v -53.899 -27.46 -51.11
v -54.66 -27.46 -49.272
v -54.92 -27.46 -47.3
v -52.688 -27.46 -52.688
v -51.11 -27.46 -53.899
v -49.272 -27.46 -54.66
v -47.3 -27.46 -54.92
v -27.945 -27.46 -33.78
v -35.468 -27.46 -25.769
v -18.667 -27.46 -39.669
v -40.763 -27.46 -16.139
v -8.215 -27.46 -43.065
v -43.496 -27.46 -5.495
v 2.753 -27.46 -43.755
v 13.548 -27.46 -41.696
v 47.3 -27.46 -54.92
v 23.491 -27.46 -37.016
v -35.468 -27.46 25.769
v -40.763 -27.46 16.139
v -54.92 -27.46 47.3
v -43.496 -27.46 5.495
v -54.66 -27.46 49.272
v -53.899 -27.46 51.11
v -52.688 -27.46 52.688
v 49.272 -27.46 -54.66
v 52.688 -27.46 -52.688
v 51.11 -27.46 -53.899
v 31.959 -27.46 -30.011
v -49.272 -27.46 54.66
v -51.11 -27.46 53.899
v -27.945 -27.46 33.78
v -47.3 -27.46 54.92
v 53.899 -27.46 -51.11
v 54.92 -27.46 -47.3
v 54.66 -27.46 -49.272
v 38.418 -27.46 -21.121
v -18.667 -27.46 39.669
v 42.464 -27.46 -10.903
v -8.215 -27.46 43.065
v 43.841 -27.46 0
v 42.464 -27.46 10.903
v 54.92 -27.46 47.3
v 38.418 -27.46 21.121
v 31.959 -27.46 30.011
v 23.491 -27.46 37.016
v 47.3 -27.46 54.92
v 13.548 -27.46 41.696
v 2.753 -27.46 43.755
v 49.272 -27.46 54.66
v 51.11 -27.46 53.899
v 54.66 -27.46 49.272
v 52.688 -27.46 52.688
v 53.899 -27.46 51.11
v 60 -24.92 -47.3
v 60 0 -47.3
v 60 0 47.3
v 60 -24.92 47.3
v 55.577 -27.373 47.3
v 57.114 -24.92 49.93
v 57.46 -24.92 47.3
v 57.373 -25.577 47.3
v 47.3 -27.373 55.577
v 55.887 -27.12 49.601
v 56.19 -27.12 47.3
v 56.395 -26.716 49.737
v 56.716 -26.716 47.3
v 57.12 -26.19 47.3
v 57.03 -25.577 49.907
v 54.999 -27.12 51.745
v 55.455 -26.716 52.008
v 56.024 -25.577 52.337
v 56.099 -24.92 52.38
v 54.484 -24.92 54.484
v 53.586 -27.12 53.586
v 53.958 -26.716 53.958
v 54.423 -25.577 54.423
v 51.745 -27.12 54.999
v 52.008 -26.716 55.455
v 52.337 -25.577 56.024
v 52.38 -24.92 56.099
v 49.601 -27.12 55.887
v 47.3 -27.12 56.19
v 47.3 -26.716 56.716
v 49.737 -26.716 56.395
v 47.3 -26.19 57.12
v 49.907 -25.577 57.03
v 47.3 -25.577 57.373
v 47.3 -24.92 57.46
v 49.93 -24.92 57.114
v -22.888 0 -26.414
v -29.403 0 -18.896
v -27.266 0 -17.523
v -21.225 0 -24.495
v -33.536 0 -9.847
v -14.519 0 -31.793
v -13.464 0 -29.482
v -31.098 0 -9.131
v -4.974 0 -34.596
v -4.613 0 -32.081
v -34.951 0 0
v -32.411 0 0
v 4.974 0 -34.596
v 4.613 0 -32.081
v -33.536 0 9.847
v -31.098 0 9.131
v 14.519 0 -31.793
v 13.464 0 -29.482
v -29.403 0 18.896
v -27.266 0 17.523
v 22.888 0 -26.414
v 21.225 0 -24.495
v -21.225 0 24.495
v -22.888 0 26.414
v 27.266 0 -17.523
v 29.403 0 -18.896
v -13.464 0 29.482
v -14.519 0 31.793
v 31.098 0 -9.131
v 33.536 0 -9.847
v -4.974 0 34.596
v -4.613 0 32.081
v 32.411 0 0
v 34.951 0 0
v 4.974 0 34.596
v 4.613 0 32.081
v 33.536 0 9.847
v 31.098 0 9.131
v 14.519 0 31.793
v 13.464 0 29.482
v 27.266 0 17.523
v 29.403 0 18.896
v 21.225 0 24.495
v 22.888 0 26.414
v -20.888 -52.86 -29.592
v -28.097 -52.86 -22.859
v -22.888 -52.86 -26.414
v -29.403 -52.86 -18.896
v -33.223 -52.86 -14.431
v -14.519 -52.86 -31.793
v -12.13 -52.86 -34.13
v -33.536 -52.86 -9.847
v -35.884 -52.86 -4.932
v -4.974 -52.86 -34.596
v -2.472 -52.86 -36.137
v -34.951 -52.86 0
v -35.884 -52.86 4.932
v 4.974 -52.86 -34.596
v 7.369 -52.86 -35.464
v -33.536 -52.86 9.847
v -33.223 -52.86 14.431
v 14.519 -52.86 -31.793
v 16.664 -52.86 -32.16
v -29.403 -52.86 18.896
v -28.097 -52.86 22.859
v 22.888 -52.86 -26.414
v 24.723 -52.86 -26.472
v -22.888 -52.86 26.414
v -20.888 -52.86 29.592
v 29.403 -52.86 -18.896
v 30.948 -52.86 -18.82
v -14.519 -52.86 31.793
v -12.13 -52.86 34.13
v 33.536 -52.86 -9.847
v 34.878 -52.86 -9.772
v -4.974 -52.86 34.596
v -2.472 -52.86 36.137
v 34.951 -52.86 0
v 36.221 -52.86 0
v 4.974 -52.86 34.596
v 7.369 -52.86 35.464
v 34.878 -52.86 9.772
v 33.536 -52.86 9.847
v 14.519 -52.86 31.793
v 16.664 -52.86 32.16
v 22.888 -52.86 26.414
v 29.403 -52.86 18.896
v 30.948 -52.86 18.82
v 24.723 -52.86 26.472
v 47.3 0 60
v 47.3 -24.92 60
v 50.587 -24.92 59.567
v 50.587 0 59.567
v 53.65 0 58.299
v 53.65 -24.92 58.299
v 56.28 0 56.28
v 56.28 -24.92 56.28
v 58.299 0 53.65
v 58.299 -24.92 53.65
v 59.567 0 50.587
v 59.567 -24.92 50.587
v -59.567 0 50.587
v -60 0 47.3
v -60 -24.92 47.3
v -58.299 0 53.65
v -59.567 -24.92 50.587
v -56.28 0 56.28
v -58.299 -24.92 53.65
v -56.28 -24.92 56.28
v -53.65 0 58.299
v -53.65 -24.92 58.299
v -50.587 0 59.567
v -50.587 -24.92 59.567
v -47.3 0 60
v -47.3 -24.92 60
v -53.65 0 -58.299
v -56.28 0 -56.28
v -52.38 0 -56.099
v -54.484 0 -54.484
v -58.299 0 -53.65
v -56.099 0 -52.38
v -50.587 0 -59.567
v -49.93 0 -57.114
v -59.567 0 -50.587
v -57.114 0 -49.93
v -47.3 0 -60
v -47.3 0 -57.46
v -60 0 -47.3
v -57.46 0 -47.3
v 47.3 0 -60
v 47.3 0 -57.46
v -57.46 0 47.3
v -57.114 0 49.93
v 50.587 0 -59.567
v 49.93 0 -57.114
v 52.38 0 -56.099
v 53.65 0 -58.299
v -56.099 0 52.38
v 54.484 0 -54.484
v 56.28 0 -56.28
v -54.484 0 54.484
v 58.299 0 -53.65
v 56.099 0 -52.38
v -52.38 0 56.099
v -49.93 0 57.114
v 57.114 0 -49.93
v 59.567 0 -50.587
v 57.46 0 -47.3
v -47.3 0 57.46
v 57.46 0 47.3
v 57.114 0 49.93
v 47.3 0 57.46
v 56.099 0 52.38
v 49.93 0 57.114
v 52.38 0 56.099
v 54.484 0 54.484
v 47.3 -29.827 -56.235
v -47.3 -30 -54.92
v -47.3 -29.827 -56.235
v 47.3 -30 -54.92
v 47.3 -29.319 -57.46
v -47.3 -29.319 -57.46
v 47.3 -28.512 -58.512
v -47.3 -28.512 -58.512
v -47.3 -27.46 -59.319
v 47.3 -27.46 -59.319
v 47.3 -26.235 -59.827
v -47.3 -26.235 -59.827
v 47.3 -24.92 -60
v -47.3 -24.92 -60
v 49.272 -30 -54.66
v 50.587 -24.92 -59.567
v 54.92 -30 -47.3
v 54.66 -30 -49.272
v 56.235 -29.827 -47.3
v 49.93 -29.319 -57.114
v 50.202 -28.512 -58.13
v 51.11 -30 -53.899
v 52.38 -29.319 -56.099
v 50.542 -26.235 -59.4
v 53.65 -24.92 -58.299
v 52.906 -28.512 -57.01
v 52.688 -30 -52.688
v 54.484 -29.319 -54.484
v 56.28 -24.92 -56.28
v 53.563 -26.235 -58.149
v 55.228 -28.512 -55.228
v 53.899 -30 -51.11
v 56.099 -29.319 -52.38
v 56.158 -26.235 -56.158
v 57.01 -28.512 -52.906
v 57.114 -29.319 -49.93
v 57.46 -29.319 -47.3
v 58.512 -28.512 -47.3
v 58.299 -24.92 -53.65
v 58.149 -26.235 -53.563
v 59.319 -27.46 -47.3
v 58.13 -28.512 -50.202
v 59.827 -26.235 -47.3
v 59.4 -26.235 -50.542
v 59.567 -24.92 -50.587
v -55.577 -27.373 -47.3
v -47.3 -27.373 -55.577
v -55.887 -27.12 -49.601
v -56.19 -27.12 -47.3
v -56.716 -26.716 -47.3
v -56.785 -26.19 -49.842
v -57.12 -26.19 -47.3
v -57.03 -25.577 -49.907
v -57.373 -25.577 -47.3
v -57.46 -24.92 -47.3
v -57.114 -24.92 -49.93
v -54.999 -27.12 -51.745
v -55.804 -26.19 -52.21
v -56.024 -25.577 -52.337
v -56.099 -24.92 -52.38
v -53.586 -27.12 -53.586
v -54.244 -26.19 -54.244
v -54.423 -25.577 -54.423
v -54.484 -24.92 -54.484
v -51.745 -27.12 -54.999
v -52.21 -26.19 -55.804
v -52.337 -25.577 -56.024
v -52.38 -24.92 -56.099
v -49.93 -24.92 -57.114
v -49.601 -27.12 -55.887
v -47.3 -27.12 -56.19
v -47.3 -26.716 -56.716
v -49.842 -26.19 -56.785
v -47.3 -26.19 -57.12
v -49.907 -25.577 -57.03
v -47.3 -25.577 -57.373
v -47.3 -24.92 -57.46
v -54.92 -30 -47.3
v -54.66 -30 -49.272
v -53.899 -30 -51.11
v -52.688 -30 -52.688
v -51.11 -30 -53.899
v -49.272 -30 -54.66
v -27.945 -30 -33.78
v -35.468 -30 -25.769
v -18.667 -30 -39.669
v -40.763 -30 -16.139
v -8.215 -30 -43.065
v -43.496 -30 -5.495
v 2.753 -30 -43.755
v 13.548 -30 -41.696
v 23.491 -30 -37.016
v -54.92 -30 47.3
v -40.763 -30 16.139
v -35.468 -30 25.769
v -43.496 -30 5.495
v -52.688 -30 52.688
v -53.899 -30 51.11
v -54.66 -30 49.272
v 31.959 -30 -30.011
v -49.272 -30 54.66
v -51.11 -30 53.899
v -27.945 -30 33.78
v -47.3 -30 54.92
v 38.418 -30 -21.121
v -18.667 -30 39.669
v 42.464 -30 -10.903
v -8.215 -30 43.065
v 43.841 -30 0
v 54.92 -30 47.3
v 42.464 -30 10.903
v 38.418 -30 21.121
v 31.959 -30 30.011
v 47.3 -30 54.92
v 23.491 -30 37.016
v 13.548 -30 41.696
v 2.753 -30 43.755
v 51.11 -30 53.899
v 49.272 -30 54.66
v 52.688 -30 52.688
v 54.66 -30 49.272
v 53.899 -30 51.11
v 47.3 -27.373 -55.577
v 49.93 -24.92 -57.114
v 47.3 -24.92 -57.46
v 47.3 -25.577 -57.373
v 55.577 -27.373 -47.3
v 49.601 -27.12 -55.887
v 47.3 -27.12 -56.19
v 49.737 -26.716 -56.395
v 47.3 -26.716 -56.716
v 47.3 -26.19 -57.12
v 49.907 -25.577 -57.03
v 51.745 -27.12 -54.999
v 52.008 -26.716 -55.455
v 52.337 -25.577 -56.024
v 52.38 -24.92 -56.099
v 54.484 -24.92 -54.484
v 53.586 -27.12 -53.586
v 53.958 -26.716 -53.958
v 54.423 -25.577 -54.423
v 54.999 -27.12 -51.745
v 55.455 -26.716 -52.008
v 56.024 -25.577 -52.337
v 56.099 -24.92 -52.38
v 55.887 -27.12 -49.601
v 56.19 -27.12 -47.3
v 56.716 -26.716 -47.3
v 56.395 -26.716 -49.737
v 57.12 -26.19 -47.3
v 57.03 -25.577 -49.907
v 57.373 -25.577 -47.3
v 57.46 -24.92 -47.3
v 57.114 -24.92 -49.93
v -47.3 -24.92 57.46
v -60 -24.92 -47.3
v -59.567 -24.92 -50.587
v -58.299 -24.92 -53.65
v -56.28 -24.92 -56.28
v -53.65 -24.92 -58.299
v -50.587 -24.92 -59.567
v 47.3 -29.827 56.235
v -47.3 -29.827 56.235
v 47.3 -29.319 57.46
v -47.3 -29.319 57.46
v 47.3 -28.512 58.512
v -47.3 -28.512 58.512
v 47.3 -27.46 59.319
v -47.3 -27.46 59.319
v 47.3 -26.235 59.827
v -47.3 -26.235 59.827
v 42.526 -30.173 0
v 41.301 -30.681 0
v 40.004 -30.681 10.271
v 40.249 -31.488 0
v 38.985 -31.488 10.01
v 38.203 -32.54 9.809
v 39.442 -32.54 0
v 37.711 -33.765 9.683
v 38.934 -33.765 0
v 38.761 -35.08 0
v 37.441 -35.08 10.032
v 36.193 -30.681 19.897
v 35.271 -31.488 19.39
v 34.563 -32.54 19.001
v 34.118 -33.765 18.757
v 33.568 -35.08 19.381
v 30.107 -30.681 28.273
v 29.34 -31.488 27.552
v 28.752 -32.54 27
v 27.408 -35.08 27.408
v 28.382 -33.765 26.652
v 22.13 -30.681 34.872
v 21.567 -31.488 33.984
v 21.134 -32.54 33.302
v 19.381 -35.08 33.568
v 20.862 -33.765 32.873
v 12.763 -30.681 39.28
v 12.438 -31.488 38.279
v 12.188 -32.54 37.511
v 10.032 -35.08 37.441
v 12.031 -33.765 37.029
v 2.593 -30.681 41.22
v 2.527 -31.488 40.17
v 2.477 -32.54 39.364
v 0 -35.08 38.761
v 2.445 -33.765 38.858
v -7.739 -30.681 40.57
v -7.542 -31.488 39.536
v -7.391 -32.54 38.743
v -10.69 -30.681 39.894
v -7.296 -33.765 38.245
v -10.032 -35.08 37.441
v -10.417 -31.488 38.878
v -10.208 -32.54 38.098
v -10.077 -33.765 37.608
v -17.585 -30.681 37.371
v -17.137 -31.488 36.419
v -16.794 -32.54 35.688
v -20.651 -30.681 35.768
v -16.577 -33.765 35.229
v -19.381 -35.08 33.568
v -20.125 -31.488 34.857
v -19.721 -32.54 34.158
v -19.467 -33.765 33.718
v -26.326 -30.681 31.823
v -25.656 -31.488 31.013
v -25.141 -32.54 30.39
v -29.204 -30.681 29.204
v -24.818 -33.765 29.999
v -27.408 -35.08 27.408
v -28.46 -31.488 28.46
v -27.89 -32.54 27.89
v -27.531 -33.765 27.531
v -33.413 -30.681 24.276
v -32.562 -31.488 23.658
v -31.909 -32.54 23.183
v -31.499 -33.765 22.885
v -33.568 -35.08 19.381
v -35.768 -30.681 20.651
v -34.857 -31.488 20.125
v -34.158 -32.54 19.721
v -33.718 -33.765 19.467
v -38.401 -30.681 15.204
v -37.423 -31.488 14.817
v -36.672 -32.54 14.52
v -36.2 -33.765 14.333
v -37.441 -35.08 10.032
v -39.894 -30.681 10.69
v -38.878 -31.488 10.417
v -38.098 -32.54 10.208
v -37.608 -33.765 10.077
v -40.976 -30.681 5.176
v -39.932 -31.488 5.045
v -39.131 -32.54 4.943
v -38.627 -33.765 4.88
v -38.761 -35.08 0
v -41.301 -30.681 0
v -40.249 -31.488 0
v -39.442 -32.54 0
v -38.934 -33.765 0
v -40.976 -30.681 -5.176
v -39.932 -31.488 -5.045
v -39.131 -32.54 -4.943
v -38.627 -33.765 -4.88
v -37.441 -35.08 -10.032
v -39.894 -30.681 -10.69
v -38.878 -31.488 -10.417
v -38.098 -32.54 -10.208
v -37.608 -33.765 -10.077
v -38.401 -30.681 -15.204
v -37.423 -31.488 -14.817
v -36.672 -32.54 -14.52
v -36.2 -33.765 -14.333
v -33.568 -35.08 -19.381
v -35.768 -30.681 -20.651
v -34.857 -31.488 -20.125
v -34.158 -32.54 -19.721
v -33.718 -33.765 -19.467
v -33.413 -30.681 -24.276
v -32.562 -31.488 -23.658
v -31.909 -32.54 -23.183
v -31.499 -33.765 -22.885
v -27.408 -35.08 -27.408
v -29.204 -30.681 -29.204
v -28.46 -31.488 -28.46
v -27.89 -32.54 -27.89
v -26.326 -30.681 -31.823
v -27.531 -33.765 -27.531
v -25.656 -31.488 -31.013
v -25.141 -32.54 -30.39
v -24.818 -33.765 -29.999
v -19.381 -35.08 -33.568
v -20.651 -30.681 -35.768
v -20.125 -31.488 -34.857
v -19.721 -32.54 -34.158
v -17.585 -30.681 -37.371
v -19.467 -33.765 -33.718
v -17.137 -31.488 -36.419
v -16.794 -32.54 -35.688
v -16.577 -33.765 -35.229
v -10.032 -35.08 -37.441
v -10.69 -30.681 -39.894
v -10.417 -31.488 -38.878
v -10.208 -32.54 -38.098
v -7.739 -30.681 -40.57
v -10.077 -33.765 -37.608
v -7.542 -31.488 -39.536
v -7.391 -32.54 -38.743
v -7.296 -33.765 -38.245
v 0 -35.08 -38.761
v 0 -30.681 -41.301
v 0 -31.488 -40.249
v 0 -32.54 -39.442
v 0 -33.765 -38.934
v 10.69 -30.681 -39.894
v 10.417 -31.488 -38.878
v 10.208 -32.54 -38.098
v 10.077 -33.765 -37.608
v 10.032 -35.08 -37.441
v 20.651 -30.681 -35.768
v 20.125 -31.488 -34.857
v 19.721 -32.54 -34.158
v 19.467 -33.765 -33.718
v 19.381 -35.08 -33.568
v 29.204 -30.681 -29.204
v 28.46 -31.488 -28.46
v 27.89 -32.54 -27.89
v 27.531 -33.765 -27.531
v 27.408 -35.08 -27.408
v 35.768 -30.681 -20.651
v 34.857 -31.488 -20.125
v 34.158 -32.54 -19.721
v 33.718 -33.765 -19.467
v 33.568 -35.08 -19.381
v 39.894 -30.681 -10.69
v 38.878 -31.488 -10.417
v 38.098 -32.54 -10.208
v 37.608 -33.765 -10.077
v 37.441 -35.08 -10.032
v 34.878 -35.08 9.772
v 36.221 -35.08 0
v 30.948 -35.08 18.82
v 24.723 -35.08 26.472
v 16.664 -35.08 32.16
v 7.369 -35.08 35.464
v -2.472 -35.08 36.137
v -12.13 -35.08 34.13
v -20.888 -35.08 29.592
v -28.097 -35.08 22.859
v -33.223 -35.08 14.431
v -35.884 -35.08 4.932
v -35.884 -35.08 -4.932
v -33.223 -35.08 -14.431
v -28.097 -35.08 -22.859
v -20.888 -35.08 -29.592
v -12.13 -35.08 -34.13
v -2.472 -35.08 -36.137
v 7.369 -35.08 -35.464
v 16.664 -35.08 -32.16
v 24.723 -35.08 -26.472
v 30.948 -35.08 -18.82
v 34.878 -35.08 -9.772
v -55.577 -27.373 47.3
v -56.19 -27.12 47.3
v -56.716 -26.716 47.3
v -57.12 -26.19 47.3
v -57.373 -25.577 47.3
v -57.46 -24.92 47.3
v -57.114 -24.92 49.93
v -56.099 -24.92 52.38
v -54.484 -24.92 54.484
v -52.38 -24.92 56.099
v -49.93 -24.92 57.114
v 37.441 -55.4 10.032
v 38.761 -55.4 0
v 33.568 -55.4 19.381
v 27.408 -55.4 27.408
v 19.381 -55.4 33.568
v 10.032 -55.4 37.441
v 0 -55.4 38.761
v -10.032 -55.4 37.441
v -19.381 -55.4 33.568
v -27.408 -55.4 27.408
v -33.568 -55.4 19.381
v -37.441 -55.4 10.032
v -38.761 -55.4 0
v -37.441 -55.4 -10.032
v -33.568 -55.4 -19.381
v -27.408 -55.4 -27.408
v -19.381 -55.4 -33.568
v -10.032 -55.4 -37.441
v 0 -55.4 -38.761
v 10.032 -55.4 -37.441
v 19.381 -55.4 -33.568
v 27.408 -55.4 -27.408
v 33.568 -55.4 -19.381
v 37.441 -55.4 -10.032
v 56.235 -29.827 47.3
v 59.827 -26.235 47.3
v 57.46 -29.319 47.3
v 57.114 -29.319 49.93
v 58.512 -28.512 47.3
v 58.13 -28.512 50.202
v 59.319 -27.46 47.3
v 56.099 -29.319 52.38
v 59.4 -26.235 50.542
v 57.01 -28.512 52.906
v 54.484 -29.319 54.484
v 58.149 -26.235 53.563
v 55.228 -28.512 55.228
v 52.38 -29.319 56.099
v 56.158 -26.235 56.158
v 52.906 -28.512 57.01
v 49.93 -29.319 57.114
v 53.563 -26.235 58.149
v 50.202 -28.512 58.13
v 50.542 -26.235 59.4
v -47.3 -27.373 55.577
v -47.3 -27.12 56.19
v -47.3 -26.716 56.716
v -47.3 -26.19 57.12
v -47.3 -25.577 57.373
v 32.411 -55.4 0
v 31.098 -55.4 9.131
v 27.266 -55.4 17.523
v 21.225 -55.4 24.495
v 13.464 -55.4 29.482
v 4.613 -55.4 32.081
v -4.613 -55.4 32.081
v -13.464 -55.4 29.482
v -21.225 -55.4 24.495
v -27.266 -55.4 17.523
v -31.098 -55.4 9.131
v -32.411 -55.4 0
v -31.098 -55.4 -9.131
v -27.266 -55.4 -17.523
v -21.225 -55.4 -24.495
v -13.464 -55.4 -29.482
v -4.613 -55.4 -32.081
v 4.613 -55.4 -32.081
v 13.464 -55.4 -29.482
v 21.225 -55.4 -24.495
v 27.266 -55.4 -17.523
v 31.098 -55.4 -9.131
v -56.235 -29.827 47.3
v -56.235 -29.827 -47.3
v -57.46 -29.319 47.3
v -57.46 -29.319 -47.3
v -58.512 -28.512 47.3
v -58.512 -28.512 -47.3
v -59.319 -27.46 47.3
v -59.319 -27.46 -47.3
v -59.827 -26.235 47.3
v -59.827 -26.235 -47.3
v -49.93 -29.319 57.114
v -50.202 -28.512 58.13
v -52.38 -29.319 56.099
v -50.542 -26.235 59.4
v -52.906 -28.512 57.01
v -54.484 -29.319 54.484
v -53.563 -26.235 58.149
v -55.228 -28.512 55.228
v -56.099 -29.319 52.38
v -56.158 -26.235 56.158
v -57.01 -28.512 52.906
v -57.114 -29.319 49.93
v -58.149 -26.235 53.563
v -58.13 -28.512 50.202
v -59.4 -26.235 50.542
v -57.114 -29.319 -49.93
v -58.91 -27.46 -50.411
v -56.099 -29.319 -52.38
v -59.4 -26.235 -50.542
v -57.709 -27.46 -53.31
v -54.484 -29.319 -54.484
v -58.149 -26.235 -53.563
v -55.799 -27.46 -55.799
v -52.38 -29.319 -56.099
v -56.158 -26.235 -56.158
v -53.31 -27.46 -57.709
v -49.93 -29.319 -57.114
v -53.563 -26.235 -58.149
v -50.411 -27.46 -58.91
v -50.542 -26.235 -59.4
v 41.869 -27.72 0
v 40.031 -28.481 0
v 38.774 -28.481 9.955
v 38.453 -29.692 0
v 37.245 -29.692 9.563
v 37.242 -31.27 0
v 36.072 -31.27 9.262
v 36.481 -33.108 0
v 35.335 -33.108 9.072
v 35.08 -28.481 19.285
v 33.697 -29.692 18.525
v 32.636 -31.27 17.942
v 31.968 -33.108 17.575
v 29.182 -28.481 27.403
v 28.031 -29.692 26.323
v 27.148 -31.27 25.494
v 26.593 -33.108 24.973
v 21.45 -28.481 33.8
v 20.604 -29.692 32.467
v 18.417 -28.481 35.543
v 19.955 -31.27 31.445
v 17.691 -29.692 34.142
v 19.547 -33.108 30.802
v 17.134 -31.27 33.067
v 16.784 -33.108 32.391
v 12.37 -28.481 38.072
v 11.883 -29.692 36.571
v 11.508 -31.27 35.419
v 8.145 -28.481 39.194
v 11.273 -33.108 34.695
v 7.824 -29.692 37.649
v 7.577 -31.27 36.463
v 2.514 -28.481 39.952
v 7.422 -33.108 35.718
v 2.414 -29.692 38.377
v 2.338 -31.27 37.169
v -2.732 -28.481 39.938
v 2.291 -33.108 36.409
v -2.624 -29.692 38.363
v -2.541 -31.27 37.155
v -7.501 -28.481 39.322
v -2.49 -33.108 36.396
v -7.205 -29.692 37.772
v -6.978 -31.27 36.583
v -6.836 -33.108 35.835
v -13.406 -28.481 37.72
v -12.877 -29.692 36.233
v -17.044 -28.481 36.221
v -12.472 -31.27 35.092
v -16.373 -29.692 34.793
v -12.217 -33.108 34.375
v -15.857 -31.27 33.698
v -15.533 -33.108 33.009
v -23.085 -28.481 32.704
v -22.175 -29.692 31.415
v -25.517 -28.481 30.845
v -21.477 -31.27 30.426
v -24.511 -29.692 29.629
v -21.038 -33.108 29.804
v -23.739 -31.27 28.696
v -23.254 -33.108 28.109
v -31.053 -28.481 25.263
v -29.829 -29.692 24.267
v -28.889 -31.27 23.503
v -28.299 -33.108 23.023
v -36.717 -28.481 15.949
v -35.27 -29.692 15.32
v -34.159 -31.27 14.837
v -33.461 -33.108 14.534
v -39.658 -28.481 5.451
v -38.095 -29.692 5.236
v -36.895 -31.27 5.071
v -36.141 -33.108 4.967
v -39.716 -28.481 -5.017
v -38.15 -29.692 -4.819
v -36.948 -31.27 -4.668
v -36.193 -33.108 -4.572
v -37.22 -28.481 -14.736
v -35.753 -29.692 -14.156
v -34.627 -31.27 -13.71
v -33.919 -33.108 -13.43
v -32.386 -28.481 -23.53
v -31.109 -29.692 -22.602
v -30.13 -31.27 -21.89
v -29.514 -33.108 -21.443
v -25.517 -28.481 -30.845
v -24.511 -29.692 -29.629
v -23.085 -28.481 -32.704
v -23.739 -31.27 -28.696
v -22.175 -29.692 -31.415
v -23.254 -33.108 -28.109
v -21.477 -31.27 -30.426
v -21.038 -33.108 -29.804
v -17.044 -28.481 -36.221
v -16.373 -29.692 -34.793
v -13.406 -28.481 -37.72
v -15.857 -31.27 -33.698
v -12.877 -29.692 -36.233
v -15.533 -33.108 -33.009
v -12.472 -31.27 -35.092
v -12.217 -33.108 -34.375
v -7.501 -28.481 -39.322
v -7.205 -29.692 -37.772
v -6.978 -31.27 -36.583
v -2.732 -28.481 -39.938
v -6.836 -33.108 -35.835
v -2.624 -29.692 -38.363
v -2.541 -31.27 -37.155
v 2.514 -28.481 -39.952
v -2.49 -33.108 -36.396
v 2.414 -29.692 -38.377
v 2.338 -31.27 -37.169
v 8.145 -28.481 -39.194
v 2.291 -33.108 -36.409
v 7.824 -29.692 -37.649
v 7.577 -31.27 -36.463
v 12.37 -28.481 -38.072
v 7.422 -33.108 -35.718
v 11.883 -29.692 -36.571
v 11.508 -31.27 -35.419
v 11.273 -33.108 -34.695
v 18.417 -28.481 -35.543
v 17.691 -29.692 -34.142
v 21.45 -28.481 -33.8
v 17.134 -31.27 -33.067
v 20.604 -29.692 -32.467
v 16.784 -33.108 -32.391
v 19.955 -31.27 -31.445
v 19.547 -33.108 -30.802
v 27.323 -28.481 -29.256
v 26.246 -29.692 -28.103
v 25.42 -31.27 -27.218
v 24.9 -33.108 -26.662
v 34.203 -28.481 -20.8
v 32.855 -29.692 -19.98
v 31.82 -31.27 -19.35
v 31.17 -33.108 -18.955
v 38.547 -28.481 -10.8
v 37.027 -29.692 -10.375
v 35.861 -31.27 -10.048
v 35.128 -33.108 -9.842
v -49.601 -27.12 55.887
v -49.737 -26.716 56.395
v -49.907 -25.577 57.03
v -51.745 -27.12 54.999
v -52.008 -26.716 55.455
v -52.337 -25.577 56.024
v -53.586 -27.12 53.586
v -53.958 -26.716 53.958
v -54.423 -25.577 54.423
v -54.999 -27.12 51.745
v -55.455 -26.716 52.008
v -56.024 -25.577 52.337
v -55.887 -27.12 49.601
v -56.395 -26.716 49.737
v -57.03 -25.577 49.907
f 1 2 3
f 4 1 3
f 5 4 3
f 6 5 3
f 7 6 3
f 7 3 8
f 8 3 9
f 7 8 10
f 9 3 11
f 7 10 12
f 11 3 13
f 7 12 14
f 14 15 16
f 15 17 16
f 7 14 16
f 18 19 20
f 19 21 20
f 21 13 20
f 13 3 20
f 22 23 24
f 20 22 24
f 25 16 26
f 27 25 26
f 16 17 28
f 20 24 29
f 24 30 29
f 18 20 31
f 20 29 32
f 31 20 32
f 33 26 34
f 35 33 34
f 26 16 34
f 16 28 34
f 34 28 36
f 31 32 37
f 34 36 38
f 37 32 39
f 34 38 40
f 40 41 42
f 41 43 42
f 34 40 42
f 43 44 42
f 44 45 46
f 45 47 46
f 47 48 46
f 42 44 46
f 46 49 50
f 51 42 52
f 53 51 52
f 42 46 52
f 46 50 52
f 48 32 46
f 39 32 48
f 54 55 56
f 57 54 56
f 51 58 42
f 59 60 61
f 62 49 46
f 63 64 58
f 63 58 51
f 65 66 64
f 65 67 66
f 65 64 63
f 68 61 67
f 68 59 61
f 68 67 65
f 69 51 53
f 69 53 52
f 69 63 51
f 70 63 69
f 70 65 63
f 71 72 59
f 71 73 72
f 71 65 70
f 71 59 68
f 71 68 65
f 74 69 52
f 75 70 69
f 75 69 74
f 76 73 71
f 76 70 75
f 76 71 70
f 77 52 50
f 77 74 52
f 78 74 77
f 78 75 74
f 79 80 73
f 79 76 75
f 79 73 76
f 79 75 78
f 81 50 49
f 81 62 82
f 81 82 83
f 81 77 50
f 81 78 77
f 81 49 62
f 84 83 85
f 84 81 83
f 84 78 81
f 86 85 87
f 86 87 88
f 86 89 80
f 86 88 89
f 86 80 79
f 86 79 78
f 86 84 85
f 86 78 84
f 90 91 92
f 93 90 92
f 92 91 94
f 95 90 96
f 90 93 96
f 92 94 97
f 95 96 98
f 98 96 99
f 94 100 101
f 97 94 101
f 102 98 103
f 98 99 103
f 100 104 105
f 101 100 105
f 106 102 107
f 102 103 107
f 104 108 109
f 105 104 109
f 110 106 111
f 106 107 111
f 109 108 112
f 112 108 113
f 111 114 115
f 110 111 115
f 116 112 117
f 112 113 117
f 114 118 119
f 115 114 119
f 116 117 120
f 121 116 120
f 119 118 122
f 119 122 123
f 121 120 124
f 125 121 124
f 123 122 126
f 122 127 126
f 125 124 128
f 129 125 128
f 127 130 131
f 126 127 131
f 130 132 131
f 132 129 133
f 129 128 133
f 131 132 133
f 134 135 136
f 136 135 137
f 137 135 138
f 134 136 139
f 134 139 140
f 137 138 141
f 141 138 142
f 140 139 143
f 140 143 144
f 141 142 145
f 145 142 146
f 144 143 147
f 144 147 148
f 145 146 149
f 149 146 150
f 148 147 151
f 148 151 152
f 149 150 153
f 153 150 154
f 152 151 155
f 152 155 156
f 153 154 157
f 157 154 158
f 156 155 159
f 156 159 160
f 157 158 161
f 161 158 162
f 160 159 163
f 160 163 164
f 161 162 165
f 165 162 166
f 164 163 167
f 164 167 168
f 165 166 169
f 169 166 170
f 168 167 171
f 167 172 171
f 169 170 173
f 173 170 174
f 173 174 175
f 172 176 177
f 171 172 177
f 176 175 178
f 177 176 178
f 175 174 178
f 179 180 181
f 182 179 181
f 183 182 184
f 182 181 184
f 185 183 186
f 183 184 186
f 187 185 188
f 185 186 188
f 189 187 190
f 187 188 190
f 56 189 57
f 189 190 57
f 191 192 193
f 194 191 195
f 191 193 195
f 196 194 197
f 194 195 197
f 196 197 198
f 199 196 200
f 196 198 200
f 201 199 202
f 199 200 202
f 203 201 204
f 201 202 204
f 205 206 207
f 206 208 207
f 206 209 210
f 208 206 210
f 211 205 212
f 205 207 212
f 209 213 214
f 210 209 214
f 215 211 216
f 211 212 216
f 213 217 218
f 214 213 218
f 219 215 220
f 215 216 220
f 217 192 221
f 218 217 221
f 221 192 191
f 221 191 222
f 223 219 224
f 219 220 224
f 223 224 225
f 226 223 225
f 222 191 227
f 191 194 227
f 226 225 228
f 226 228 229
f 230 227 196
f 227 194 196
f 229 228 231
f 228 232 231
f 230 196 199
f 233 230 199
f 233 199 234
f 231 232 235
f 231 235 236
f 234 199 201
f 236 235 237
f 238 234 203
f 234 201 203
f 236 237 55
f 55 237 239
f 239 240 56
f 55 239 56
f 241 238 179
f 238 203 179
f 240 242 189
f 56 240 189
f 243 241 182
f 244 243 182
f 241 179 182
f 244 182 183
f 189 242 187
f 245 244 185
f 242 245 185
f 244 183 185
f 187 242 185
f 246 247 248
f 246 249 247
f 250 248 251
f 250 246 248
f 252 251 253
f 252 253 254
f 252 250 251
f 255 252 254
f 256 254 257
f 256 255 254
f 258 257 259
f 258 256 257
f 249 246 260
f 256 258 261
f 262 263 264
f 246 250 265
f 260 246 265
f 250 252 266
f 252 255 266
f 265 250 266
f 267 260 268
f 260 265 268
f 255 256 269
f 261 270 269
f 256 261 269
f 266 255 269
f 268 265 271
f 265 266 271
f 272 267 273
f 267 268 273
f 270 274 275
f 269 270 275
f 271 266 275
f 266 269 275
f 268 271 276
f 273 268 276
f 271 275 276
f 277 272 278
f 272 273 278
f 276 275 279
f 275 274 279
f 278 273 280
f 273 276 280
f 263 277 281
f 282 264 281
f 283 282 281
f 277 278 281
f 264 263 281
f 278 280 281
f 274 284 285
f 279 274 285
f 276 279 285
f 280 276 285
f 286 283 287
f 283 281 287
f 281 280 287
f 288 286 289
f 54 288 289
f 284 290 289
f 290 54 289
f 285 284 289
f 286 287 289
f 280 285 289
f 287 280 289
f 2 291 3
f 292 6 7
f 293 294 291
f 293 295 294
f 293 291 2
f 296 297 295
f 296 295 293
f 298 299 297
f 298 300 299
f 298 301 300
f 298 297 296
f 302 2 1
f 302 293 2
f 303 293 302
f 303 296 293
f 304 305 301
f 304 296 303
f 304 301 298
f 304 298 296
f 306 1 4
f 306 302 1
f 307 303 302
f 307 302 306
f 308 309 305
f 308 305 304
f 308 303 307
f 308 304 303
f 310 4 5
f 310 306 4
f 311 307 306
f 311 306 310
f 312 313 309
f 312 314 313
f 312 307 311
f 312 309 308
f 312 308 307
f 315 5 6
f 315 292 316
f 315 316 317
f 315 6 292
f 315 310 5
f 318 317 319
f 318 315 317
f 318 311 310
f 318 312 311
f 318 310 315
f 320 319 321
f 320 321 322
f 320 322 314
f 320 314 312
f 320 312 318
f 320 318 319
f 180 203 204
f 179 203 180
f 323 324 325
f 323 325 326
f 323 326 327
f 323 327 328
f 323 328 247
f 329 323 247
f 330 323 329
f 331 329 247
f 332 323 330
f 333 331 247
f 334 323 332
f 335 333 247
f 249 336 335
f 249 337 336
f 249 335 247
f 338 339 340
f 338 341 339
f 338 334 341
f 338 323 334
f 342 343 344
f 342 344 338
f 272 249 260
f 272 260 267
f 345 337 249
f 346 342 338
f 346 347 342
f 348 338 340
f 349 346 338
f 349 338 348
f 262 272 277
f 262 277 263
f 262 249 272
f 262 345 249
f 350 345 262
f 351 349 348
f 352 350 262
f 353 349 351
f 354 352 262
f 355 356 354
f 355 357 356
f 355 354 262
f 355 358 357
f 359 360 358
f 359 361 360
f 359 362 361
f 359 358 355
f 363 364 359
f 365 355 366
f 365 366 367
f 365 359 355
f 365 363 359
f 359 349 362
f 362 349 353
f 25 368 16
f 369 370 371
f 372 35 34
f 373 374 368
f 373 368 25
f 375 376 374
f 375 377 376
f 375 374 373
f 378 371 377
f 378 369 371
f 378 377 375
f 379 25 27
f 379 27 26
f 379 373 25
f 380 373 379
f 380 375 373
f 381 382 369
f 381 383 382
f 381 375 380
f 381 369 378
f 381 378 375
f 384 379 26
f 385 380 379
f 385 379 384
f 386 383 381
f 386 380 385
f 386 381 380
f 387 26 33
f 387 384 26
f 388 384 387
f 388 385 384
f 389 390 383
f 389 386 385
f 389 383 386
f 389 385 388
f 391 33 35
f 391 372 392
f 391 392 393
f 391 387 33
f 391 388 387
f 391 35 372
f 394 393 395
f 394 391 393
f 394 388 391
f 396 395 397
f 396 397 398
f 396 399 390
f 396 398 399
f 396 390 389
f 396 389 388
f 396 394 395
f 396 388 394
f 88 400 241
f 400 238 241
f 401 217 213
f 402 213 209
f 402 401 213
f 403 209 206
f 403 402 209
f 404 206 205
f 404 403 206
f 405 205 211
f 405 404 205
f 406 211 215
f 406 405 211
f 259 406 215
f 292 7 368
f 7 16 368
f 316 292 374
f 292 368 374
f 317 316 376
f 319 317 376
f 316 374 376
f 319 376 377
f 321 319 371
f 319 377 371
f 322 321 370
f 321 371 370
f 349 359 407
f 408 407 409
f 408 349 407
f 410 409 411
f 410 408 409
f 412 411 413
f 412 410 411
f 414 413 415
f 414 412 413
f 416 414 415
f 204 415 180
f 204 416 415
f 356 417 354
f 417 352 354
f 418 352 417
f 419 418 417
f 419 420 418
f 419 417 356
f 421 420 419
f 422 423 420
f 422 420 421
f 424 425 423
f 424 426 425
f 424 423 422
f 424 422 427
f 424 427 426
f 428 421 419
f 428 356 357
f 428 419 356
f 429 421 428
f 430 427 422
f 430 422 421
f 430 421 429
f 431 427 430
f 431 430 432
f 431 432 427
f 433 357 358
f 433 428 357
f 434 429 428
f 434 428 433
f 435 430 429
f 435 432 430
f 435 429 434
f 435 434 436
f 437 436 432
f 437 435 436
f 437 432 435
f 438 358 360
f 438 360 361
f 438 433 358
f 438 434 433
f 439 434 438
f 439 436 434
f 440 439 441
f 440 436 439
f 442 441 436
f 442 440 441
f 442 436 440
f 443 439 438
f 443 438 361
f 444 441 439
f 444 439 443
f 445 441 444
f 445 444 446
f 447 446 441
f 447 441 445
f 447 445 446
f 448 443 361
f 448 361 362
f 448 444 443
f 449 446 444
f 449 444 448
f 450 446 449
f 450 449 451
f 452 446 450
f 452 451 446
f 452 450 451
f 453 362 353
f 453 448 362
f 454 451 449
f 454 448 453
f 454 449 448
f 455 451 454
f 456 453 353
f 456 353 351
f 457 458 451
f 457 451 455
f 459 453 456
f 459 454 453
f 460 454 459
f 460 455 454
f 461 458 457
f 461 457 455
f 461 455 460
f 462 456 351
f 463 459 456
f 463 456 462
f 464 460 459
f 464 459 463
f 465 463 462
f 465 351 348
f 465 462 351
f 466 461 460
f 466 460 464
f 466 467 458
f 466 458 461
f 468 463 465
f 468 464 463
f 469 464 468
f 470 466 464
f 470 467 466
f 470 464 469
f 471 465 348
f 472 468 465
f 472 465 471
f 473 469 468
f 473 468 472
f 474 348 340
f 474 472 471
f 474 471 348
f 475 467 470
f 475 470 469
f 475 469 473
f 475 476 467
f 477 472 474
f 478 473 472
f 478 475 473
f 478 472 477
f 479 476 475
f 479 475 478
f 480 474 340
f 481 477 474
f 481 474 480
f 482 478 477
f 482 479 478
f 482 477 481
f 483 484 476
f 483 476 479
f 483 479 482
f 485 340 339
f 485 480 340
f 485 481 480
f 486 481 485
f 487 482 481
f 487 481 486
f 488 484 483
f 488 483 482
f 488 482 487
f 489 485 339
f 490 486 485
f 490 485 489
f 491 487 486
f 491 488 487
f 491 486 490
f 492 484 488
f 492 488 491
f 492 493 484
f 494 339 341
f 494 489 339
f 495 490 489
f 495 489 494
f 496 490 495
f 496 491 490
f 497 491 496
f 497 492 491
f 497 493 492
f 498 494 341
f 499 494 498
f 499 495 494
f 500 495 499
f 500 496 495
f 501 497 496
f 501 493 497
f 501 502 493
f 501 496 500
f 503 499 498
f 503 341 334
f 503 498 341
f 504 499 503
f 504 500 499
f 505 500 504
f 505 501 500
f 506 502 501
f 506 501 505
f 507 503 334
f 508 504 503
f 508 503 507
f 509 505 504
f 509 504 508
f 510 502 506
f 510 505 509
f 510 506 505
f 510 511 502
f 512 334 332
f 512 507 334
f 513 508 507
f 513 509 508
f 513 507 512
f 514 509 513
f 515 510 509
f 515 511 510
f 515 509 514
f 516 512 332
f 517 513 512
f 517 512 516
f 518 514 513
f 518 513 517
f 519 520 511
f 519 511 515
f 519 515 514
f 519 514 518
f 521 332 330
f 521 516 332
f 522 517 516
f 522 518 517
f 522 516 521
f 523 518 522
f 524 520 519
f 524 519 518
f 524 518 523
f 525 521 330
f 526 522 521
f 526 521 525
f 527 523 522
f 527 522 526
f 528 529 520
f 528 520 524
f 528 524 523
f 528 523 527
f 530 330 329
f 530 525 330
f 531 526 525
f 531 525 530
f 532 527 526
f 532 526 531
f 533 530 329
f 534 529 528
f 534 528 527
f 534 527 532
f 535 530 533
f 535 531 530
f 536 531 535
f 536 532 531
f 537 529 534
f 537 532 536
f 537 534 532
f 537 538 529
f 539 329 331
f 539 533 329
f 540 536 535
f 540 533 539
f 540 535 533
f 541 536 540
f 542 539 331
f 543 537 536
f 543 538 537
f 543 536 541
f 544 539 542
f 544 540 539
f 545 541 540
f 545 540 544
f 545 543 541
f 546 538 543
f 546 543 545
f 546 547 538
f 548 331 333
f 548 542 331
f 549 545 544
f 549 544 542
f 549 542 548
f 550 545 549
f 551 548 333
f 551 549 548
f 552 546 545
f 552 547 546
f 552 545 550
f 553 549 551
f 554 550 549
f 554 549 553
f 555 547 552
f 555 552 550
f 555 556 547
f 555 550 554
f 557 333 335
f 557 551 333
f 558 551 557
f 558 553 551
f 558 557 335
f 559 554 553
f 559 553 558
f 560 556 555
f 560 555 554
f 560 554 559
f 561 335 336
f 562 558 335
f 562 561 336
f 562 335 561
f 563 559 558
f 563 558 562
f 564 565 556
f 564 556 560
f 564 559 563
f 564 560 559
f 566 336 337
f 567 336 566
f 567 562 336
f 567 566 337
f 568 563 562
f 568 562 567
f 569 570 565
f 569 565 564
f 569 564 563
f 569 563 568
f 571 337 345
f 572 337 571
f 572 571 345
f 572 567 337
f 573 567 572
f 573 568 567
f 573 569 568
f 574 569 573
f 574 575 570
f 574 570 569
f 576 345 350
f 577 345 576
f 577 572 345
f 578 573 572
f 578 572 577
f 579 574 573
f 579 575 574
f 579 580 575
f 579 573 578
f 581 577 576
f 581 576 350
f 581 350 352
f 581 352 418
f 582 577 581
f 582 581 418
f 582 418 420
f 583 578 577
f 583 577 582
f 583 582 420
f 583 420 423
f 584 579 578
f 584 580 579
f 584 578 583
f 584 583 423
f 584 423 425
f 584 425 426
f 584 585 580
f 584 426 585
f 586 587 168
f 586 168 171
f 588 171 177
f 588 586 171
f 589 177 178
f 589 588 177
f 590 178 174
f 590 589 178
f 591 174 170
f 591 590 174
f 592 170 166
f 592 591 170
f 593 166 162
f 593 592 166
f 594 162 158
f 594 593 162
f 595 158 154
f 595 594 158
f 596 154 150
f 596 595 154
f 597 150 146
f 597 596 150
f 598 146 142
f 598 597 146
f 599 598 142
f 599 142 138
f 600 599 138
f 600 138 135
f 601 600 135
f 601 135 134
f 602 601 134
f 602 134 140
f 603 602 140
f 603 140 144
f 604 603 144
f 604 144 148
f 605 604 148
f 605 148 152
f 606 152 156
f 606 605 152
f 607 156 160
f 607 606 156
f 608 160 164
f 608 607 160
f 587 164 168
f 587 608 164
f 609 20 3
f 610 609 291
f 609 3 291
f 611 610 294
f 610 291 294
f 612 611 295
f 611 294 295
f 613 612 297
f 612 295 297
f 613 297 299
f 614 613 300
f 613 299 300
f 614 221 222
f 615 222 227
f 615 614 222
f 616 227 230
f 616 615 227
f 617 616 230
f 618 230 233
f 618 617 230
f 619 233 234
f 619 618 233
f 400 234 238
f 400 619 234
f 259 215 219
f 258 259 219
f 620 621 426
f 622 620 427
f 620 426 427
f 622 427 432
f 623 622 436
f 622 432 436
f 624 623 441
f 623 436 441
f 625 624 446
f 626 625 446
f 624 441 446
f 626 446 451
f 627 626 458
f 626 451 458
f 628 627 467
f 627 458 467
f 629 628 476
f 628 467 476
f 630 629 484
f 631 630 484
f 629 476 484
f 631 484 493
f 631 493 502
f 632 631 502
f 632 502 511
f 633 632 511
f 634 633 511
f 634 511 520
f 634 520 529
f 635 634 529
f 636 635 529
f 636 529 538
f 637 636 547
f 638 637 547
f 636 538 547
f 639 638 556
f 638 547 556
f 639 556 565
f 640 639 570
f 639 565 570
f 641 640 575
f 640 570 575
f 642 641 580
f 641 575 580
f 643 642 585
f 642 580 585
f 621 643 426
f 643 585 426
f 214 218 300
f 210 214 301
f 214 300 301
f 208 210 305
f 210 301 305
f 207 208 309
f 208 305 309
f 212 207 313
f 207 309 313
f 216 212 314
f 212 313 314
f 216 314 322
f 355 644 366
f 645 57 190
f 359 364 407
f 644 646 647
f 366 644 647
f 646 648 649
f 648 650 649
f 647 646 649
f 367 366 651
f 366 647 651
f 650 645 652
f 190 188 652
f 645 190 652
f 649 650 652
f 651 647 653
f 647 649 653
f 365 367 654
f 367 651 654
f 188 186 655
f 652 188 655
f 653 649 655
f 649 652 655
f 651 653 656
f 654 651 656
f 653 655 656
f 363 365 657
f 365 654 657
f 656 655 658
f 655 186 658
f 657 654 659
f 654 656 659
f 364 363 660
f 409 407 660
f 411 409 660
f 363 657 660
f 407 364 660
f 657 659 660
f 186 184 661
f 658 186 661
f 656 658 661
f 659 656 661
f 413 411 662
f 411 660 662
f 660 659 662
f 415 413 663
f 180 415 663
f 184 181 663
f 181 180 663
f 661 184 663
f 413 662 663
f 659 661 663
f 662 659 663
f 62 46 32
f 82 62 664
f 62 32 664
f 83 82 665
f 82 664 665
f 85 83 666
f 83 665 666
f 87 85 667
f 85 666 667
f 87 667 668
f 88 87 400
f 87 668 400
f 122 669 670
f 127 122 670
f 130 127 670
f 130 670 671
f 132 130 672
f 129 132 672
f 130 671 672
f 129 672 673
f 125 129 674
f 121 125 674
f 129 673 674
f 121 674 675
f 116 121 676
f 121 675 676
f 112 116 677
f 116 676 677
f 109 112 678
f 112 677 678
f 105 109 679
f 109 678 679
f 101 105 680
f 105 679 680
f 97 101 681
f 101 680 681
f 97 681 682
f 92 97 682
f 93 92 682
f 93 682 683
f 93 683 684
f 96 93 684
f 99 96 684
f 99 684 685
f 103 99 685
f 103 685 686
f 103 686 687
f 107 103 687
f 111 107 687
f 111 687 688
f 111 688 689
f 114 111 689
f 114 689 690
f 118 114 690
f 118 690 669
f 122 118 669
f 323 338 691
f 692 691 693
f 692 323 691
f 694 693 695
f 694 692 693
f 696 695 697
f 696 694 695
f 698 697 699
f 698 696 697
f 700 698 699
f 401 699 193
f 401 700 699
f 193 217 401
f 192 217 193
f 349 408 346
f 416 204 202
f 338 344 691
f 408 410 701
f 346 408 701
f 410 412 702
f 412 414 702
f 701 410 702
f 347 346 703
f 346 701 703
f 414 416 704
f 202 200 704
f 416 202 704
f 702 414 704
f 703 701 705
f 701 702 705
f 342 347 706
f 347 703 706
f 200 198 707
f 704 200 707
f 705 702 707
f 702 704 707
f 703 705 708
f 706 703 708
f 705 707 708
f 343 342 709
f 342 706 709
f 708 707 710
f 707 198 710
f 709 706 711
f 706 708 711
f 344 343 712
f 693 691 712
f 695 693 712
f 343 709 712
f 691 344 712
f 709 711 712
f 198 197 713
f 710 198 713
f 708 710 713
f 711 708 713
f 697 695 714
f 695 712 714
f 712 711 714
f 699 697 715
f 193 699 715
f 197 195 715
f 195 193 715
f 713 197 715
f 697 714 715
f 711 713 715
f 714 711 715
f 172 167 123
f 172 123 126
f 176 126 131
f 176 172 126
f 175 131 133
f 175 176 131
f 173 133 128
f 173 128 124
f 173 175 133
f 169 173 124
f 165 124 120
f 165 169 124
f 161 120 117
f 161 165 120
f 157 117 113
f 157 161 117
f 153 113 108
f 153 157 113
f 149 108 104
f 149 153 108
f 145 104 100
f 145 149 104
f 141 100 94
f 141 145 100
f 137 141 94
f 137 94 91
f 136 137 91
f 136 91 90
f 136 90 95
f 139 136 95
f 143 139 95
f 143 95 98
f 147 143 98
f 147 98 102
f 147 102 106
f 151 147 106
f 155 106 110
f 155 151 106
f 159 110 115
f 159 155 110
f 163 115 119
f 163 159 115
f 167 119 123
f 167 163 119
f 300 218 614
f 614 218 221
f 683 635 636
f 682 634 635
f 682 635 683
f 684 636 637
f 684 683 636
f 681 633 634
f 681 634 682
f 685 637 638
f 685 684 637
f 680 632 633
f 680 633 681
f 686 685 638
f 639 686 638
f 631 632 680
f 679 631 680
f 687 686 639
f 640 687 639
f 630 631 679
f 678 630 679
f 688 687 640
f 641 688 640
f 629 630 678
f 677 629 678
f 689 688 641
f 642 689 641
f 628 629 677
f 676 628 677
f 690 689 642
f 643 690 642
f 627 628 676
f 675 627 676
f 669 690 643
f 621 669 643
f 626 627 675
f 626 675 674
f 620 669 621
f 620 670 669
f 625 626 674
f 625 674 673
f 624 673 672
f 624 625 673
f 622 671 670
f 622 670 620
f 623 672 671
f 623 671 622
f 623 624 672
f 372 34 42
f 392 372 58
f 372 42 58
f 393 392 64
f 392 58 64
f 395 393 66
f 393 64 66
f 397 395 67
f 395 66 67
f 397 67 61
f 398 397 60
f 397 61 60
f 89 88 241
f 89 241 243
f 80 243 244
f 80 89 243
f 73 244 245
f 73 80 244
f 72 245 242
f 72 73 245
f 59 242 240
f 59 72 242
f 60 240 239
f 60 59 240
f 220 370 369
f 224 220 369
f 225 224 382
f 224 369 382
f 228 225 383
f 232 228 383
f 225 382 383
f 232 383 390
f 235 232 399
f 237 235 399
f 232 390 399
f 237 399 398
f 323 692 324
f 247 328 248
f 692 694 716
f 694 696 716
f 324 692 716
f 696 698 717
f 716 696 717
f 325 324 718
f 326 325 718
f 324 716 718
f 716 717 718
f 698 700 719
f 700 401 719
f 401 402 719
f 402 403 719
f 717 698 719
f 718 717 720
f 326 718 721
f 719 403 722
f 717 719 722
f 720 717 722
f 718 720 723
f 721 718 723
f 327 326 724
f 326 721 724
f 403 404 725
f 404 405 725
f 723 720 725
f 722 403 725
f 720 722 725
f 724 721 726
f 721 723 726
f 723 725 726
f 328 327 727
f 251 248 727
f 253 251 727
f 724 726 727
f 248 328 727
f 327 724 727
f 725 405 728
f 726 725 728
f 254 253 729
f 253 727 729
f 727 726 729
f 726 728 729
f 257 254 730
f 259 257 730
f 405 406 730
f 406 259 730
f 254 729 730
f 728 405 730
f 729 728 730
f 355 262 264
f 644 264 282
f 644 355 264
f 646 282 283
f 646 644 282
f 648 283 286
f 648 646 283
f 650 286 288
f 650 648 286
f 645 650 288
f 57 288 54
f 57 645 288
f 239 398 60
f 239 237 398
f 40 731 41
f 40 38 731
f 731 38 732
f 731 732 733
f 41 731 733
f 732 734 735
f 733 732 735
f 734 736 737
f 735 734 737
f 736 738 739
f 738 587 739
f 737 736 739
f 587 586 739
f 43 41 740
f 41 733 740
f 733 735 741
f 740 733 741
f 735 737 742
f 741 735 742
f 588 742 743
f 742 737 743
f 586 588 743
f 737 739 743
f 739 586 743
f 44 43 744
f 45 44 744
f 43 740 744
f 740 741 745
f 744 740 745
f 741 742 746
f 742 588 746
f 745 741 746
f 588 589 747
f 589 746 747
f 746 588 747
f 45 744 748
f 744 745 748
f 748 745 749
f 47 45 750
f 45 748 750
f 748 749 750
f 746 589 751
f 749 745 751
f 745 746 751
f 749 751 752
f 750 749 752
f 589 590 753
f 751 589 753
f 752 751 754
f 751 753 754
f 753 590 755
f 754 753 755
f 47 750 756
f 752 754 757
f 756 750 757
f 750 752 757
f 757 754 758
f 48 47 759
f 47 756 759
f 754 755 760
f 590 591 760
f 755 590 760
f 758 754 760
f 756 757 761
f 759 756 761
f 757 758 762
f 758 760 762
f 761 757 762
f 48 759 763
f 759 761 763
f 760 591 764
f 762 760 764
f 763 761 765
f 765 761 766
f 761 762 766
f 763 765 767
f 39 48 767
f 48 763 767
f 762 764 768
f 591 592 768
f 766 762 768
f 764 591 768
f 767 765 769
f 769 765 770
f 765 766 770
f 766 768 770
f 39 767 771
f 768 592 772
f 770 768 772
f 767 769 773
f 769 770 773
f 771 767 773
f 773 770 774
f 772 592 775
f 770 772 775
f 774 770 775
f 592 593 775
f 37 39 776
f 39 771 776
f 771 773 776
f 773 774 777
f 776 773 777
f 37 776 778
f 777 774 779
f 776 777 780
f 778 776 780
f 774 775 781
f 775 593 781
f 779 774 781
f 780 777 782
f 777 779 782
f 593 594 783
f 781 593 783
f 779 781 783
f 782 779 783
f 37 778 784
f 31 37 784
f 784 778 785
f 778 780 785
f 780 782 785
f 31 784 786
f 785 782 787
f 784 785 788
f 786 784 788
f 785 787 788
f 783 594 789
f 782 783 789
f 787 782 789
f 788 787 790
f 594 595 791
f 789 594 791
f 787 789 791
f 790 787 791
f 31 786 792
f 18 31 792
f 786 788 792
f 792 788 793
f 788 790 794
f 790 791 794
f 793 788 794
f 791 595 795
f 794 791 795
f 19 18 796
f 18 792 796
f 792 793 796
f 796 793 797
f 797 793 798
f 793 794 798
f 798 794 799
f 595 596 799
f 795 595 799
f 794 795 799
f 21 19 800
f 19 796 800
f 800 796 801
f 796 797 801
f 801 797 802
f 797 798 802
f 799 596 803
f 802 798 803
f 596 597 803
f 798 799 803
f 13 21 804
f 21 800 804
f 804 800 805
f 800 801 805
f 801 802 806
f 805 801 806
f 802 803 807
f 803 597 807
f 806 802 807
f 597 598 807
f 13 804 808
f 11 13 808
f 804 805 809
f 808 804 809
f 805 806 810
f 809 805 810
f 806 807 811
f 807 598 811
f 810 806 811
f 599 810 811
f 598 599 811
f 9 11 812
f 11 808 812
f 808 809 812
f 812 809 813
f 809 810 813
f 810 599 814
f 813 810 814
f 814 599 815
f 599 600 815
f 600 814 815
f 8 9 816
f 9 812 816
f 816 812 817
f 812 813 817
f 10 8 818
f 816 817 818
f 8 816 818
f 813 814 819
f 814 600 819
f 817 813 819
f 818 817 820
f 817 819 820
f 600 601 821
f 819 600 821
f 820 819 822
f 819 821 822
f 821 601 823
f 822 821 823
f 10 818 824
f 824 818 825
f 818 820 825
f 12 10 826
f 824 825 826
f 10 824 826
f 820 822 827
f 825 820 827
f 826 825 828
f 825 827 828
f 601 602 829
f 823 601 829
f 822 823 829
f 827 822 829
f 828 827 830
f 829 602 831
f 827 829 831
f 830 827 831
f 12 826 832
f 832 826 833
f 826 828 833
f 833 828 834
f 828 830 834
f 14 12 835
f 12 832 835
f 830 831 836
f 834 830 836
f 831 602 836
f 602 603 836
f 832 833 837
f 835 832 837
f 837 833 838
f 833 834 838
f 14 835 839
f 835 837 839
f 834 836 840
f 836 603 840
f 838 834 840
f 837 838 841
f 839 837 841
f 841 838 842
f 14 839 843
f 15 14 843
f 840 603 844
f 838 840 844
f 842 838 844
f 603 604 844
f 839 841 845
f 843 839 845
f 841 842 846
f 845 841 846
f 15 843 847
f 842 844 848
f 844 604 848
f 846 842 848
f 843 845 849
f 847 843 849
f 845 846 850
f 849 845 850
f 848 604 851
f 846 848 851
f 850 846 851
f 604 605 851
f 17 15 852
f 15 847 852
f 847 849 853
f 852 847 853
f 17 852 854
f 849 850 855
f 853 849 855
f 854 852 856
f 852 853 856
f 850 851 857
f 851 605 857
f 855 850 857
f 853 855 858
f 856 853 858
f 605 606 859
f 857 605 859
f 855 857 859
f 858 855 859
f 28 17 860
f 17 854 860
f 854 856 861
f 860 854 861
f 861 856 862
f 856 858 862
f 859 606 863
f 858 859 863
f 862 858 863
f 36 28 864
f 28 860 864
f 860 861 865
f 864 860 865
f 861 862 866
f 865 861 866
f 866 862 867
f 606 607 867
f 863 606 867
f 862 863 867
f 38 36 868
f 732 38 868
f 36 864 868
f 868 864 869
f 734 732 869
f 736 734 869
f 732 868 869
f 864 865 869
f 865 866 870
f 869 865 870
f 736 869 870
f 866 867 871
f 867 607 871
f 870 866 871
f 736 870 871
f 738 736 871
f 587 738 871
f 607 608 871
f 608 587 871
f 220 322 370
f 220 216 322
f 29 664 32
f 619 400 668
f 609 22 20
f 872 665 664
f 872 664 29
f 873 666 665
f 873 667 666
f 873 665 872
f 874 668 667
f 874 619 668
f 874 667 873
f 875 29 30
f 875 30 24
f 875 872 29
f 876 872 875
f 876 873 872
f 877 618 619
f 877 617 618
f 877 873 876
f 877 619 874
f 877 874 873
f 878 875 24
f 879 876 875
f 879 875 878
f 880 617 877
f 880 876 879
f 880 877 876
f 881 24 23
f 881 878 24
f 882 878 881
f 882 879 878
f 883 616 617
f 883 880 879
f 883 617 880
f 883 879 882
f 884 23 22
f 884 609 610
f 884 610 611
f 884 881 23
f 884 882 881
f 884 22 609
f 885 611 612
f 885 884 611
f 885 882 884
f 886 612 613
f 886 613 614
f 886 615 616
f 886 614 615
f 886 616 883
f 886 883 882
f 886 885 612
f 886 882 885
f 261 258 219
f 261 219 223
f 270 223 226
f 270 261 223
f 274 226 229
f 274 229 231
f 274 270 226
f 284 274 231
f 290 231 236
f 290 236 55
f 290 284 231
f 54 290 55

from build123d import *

# Parameters (mm, degrees)
F0_W     = 120
F0_H     = 120
F1_DEPTH = 30
F2_R     = 38.7612750812
F3_DEPTH = 25.4
F4_R     = 32.4112735689
F5_DEPTH = 55.401
F6_R     = 12.7
F7_R     = 5.08
F8_T     = -2.54


with BuildPart() as f1:
    # F0 (on Front) → F1 (new body)
    with BuildSketch(Plane.XZ):
        Rectangle(F0_W, F0_H)
    extrude(amount=F1_DEPTH)

    # F2 (on face) → F3 (join)
    with BuildSketch(Plane.XZ.offset(30)):
        Circle(F2_R)
    extrude(amount=F3_DEPTH)

    # F4 (on face) → F5 (cut, through all)
    with BuildSketch(Plane.XZ.offset(55.4)):
        Circle(F4_R)
    extrude(amount=-F5_DEPTH, mode=Mode.SUBTRACT)

    # F6
    f6_edges = [f1.edges().sort_by_distance(p)[0] for p in [
        (-60, -15, -60),
        (-60, -15, 60),
        (60, -15, 60),
        (60, -15, -60),
    ]]
    fillet(f6_edges, radius=F6_R)

    # F7
    f7_edges = [f1.edges().sort_by_distance(p)[0] for p in [
        (0, -30, -60),
        (-56.280256, -30, -56.280256),
        (56.280256, -30, -56.280256),
        (-60, -30, 0),
        (60, -30, 0),
        (-56.280256, -30, 56.280256),
        (56.280256, -30, 56.280256),
        (0, -30, 60),
        (-38.761275, -30, 0),
    ]]
    fillet(f7_edges, radius=F7_R)

    # F8
    f8_openings = [f1.faces().sort_by_distance(p)[0] for p in [
        (0, 0, -58.302944),
    ]]
    offset(amount=F8_T, openings=f8_openings)


solid = f1.part
